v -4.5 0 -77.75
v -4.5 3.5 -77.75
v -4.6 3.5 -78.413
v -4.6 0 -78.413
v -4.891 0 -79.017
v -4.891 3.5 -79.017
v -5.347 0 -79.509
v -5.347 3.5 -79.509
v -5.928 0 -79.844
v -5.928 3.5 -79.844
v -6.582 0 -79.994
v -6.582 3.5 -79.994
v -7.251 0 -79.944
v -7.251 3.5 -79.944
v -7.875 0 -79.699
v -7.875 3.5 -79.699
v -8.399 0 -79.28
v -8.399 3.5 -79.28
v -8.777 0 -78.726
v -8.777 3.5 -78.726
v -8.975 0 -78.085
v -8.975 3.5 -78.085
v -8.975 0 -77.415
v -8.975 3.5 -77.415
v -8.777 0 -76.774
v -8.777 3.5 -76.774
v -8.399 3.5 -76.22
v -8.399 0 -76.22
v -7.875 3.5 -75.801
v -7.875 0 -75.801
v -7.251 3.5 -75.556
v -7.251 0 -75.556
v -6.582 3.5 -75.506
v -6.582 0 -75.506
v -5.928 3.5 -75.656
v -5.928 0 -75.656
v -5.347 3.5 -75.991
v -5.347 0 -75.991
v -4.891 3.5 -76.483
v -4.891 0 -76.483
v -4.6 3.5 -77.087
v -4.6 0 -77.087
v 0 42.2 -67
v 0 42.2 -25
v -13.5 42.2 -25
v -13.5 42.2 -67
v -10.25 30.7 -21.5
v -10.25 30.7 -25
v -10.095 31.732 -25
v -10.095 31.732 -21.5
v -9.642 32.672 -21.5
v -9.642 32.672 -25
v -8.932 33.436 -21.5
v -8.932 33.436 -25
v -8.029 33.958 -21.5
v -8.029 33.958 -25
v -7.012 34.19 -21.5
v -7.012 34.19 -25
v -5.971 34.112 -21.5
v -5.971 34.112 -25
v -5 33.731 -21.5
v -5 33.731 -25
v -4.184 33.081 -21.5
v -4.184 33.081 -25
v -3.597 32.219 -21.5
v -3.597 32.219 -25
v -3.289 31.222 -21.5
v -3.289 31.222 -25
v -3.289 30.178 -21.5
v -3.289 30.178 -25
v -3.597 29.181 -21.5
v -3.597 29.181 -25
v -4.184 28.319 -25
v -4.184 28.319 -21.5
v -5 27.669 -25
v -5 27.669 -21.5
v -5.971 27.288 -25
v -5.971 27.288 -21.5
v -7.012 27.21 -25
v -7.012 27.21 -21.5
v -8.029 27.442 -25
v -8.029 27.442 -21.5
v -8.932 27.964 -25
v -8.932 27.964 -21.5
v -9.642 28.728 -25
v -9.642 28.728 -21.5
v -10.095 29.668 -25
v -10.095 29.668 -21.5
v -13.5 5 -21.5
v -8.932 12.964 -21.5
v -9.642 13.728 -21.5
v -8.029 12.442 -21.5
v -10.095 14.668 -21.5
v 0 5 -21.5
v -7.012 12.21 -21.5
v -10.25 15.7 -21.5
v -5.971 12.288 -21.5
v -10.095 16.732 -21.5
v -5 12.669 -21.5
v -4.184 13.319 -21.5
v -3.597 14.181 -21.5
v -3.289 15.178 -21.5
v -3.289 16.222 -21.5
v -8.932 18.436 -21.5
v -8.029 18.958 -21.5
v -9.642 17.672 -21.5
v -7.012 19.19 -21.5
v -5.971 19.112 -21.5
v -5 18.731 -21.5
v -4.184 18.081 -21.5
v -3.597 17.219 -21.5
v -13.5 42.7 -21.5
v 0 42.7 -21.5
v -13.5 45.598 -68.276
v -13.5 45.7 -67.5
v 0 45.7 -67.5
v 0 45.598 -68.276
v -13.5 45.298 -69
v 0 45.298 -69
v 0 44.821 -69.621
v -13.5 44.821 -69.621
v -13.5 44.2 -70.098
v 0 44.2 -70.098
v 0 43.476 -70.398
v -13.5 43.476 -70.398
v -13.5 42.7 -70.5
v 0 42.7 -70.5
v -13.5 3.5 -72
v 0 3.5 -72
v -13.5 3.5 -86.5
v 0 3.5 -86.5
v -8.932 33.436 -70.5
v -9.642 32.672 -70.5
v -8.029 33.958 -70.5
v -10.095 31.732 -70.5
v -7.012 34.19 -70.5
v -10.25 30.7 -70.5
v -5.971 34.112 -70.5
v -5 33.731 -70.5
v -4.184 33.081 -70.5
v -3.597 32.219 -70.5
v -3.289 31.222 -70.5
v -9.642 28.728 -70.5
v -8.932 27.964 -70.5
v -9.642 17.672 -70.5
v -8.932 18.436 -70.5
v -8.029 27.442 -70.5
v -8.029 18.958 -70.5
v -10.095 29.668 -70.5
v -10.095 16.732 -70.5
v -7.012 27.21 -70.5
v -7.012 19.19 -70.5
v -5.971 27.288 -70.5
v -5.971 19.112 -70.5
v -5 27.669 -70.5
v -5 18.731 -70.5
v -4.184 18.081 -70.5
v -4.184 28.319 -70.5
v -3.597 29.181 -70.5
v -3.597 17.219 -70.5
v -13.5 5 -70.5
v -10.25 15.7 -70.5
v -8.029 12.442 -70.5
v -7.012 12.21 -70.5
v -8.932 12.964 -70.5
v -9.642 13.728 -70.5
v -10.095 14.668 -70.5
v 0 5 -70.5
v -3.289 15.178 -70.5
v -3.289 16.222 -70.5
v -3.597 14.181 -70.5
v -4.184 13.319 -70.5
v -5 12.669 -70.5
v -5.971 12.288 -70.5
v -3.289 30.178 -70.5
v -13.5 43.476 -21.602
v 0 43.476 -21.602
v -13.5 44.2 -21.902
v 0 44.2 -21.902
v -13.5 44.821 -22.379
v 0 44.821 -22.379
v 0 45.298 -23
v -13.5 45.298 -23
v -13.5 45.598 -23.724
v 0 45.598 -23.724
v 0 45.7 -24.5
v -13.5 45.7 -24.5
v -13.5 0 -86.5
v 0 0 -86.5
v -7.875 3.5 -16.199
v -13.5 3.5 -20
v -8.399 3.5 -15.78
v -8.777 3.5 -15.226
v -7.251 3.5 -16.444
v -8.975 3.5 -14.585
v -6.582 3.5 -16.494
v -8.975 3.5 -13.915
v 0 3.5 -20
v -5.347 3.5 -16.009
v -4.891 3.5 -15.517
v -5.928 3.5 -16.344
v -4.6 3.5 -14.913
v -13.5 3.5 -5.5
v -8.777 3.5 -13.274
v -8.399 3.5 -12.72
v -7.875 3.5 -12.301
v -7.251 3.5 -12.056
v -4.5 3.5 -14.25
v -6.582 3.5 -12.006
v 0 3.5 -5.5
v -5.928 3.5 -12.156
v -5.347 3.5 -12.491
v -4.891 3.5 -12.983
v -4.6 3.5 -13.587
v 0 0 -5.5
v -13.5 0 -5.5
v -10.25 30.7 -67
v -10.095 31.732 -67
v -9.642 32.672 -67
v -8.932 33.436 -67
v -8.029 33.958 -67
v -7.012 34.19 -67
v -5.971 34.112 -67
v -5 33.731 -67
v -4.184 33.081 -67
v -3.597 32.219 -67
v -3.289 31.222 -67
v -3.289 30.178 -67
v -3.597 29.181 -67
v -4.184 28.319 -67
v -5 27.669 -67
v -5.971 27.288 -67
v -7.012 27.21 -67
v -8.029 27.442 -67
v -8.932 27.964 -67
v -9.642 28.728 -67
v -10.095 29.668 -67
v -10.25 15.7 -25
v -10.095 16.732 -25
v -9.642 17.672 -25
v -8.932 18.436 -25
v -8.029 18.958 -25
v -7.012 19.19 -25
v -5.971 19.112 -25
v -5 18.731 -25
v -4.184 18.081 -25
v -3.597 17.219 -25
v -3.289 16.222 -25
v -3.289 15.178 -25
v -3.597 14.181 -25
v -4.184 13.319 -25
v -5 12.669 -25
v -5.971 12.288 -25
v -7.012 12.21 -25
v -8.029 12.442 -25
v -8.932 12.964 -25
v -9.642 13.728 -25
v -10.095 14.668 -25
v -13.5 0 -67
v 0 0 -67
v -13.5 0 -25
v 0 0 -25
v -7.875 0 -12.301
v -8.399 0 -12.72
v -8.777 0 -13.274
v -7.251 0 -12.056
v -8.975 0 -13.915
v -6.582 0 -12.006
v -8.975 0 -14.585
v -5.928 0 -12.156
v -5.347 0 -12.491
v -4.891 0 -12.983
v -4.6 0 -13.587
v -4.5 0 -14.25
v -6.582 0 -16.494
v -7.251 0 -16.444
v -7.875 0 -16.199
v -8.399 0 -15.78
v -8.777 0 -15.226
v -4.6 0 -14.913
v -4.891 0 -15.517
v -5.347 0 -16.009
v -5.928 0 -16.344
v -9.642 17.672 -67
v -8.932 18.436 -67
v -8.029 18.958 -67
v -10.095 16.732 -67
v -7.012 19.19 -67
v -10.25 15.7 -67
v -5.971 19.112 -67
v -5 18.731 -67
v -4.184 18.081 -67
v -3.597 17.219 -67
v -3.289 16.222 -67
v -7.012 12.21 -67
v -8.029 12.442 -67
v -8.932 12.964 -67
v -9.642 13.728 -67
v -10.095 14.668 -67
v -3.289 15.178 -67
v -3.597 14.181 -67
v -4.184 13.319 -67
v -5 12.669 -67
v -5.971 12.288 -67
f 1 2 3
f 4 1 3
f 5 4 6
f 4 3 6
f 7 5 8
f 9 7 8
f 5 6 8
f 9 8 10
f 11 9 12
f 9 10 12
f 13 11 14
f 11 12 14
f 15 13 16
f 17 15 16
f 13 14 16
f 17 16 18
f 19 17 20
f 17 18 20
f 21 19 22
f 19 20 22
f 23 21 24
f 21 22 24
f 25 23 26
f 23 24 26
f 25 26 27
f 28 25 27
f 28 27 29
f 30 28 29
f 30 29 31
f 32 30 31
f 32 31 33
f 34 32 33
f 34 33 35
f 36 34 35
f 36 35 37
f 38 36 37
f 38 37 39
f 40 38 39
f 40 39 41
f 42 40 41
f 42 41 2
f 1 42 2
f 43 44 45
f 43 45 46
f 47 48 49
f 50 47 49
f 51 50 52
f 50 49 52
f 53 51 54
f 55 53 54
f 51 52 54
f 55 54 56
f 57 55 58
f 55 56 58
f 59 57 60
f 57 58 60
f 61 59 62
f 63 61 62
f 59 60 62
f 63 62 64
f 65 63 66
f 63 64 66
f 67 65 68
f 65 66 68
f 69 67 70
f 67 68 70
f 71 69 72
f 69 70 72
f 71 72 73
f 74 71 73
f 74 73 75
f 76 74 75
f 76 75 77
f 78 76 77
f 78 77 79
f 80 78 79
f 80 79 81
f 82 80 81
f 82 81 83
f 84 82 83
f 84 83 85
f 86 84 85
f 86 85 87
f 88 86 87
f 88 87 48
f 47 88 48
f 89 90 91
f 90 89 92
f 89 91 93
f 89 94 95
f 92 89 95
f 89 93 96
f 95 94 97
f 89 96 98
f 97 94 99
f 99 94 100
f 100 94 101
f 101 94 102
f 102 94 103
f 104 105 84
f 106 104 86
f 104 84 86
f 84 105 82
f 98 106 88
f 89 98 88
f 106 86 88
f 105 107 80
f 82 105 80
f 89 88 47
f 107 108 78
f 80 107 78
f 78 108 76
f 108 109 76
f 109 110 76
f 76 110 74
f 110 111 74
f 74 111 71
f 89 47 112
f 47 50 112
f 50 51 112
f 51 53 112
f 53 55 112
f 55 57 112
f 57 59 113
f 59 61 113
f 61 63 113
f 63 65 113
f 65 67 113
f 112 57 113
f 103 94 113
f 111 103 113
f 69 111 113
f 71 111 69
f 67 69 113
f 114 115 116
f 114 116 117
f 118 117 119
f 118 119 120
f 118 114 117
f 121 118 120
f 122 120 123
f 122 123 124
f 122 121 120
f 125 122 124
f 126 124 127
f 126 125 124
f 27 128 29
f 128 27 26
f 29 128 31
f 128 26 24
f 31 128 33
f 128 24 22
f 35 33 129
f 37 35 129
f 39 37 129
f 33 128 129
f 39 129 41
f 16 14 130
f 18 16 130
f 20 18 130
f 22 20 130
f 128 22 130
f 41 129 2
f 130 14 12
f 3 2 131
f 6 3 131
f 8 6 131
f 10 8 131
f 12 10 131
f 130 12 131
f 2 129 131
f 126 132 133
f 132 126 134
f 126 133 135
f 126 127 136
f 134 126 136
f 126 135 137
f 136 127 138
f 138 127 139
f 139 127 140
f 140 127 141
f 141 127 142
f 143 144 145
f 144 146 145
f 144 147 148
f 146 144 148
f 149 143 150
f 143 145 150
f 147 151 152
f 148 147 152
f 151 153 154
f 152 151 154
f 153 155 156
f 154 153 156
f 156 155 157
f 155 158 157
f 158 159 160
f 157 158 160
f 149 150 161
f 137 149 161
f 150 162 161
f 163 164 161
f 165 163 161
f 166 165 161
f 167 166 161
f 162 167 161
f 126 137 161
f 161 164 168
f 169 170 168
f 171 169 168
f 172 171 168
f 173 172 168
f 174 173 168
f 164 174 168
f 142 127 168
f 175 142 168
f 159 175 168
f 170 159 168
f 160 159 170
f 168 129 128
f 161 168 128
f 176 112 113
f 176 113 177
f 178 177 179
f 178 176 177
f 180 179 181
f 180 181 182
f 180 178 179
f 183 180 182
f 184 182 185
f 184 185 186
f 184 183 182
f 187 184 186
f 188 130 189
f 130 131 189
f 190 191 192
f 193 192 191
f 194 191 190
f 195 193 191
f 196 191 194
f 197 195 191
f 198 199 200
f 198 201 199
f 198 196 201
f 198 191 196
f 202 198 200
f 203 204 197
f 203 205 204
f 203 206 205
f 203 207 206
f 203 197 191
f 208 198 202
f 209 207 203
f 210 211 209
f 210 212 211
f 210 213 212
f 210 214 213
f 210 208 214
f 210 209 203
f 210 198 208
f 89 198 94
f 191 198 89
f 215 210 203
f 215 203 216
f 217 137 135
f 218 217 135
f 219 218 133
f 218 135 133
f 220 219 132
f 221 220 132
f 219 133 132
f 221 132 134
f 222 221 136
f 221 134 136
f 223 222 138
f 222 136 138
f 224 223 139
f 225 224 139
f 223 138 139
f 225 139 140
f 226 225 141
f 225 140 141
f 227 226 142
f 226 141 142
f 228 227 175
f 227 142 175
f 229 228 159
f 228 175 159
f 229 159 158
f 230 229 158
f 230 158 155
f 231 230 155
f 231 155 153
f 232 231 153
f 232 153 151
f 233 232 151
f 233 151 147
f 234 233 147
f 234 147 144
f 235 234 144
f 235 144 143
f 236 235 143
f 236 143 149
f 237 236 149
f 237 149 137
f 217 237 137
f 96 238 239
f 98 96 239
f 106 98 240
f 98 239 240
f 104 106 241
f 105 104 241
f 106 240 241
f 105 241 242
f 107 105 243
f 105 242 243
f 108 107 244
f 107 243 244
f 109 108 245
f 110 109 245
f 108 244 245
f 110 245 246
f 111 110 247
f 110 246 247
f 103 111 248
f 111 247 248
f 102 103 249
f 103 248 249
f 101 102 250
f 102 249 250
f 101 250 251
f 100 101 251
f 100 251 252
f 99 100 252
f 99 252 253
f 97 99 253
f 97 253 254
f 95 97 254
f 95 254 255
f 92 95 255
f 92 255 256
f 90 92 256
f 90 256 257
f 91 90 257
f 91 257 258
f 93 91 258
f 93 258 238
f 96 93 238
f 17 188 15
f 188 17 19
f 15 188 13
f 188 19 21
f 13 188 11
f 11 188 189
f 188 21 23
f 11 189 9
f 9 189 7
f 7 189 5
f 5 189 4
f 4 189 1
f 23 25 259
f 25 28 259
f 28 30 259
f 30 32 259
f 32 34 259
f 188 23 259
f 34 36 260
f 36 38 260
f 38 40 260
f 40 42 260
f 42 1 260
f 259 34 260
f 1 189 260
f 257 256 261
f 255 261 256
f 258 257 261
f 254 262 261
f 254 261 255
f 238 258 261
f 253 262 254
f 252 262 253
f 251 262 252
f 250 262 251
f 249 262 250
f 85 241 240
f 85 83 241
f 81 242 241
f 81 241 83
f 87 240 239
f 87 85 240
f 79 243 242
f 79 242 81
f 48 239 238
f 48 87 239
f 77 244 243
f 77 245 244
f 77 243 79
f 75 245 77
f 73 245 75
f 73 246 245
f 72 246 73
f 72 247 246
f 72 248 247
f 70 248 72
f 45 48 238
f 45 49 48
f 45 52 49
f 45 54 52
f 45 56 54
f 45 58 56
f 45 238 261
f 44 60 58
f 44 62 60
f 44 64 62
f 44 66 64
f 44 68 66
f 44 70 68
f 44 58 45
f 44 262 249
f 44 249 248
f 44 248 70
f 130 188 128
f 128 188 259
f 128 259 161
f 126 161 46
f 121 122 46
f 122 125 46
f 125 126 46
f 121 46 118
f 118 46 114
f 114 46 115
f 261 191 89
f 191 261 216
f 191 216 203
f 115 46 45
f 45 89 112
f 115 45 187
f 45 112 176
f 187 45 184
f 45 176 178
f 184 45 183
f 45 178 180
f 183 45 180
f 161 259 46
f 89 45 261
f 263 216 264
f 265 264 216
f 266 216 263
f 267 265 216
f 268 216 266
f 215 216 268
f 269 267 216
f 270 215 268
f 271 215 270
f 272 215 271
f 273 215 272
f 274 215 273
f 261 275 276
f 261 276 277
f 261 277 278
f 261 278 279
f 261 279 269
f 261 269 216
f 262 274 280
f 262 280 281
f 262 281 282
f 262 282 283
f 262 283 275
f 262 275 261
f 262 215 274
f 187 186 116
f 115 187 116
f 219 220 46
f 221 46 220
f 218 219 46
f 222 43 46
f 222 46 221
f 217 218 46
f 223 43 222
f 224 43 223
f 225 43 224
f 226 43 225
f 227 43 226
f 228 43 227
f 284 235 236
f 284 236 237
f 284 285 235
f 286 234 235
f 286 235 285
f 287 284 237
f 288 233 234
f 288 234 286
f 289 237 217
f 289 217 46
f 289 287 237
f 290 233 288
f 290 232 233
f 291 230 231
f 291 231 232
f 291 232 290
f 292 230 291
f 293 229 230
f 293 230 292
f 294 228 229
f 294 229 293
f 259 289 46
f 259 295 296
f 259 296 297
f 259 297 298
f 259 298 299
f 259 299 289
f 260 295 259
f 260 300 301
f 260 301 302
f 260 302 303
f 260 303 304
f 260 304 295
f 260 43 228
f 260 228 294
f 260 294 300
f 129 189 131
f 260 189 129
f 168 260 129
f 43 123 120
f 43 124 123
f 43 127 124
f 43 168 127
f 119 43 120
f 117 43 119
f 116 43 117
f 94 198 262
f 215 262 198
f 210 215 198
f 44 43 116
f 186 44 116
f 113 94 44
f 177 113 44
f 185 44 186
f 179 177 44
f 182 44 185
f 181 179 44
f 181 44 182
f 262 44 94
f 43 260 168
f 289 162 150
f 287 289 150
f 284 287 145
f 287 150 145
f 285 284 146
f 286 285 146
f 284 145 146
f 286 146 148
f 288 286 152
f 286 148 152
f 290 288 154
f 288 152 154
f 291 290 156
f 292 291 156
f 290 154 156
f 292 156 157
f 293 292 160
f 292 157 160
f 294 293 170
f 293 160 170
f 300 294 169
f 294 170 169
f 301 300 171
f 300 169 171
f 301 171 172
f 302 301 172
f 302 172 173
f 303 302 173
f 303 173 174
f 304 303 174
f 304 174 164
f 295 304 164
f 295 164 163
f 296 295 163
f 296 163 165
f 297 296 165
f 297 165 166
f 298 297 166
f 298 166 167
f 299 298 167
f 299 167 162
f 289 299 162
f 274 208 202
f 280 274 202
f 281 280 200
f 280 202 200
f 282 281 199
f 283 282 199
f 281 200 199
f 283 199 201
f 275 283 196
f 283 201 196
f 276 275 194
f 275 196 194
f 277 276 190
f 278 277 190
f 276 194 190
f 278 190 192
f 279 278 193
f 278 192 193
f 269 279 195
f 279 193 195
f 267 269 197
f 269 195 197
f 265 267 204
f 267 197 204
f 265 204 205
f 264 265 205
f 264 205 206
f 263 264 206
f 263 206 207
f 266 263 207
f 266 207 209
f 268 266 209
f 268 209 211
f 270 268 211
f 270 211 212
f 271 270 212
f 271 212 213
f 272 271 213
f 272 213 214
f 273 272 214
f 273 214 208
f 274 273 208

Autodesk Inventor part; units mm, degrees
ref_plane "YZ Plane" through (0, 0, 0) normal (1, 0, 0) x (0, 1, 0)
ref_plane "XZ Plane" through (0, 0, 0) normal (0, 1, 0) x (-1, 0, 0)
ref_plane "XY Plane" through (0, 0, 0) normal (0, 0, 1) x (1, 0, 0)
sketch "Sketch1" plane through (0, 0, 0) normal (1, 0, 0) x (0, 1, 0)
  line L0 (0, -25) -> (42.2, -25)
  line L1 (3.5, -21.5) -> (45.7, -21.5)
  line L2 (42.2, -25) -> (42.2, -67)
  line L3 (45.7, -21.5) -> (45.7, -70.5)
  line L4 (42.2, -67) -> (3.5, -67)
  line L5 (45.7, -70.5) -> (3.5, -70.5)
  line L6 (3.5, -67) -> (0, -67)
  line L7 (3.5, -21.5) -> (3.5, -5.5)
  line L8 (3.5, -5.5) -> (0, -5.5)
  line L9 (0, -5.5) -> (0, -25)
  line L10 (3.5, -70.5) -> (3.5, -86.5)
  line L11 (3.5, -86.5) -> (0, -86.5)
  line L12 (0, -86.5) -> (0, -67)
  point P0 (0, 0)
  dimension "d3" = 42.2
  dimension "d4" = 42
  dimension "d5" = 3.5
  dimension "d7" = 3.5
  dimension "d19" = 16
  dimension "d20" = 16
extrude "Extrusion1" add sketch "Sketch1" against normal blind 13.5
sketch "Sketch3" plane through (0, 3.5, -5.5) normal (0, 1, 0) x (1, 0, 0)
  circle A0 centre (-6.75, 8.75) radius 2.25
  circle A1 centre (-6.75, 72.25) radius 2.25
  line L0 (0, 16) -> (0, 0) projected
  line L1 (0, 81) -> (0, 65) projected
  line L2 (0, 0) -> (-13.5, 0) projected
  line L3 (0, 81) -> (-13.5, 81) projected
  point P0 (0, -5.5)
  dimension "d21" = 4.5
  dimension "d22" = 4.5
  dimension "d23" = 6.75
  dimension "d24" = 6.75
  dimension "d25" = 8.75
  dimension "d26" = 8.75
extrude "Extrusion3" cut sketch "Sketch3" against normal through all
fillet "Fillet1" radius 3 2 edges at (-6.75, 45.7, -21.5) (-6.75, 45.7, -70.5)
chamfer "Chamfer1" distance 1.5 angle 45 2 edges at (-6.75, 3.5, -21.5) (-6.75, 3.5, -70.5)
sketch "Sketch5" plane through (0, 42.7, -70.5) normal (0, 0, -1) x (-1, 0, 0)
  circle A0 centre (6.75, -12) radius 3.5
  line L0 (13.5, 3) -> (0, 3) projected
  line L1 (13.5, 0) -> (13.5, -37.7) projected
  point P0 (0, -42.7)
  dimension "d44" = 7
  dimension "d45" = 15
  dimension "d51" = 6.75
extrude "Extrusion5" cut sketch "Sketch5" against normal through all
pattern_linear "Rectangular Pattern2" count 2 spacing 15 along (0, -1, 0) of "Extrusion5"
properties part number "Stepper Motor Mount"
